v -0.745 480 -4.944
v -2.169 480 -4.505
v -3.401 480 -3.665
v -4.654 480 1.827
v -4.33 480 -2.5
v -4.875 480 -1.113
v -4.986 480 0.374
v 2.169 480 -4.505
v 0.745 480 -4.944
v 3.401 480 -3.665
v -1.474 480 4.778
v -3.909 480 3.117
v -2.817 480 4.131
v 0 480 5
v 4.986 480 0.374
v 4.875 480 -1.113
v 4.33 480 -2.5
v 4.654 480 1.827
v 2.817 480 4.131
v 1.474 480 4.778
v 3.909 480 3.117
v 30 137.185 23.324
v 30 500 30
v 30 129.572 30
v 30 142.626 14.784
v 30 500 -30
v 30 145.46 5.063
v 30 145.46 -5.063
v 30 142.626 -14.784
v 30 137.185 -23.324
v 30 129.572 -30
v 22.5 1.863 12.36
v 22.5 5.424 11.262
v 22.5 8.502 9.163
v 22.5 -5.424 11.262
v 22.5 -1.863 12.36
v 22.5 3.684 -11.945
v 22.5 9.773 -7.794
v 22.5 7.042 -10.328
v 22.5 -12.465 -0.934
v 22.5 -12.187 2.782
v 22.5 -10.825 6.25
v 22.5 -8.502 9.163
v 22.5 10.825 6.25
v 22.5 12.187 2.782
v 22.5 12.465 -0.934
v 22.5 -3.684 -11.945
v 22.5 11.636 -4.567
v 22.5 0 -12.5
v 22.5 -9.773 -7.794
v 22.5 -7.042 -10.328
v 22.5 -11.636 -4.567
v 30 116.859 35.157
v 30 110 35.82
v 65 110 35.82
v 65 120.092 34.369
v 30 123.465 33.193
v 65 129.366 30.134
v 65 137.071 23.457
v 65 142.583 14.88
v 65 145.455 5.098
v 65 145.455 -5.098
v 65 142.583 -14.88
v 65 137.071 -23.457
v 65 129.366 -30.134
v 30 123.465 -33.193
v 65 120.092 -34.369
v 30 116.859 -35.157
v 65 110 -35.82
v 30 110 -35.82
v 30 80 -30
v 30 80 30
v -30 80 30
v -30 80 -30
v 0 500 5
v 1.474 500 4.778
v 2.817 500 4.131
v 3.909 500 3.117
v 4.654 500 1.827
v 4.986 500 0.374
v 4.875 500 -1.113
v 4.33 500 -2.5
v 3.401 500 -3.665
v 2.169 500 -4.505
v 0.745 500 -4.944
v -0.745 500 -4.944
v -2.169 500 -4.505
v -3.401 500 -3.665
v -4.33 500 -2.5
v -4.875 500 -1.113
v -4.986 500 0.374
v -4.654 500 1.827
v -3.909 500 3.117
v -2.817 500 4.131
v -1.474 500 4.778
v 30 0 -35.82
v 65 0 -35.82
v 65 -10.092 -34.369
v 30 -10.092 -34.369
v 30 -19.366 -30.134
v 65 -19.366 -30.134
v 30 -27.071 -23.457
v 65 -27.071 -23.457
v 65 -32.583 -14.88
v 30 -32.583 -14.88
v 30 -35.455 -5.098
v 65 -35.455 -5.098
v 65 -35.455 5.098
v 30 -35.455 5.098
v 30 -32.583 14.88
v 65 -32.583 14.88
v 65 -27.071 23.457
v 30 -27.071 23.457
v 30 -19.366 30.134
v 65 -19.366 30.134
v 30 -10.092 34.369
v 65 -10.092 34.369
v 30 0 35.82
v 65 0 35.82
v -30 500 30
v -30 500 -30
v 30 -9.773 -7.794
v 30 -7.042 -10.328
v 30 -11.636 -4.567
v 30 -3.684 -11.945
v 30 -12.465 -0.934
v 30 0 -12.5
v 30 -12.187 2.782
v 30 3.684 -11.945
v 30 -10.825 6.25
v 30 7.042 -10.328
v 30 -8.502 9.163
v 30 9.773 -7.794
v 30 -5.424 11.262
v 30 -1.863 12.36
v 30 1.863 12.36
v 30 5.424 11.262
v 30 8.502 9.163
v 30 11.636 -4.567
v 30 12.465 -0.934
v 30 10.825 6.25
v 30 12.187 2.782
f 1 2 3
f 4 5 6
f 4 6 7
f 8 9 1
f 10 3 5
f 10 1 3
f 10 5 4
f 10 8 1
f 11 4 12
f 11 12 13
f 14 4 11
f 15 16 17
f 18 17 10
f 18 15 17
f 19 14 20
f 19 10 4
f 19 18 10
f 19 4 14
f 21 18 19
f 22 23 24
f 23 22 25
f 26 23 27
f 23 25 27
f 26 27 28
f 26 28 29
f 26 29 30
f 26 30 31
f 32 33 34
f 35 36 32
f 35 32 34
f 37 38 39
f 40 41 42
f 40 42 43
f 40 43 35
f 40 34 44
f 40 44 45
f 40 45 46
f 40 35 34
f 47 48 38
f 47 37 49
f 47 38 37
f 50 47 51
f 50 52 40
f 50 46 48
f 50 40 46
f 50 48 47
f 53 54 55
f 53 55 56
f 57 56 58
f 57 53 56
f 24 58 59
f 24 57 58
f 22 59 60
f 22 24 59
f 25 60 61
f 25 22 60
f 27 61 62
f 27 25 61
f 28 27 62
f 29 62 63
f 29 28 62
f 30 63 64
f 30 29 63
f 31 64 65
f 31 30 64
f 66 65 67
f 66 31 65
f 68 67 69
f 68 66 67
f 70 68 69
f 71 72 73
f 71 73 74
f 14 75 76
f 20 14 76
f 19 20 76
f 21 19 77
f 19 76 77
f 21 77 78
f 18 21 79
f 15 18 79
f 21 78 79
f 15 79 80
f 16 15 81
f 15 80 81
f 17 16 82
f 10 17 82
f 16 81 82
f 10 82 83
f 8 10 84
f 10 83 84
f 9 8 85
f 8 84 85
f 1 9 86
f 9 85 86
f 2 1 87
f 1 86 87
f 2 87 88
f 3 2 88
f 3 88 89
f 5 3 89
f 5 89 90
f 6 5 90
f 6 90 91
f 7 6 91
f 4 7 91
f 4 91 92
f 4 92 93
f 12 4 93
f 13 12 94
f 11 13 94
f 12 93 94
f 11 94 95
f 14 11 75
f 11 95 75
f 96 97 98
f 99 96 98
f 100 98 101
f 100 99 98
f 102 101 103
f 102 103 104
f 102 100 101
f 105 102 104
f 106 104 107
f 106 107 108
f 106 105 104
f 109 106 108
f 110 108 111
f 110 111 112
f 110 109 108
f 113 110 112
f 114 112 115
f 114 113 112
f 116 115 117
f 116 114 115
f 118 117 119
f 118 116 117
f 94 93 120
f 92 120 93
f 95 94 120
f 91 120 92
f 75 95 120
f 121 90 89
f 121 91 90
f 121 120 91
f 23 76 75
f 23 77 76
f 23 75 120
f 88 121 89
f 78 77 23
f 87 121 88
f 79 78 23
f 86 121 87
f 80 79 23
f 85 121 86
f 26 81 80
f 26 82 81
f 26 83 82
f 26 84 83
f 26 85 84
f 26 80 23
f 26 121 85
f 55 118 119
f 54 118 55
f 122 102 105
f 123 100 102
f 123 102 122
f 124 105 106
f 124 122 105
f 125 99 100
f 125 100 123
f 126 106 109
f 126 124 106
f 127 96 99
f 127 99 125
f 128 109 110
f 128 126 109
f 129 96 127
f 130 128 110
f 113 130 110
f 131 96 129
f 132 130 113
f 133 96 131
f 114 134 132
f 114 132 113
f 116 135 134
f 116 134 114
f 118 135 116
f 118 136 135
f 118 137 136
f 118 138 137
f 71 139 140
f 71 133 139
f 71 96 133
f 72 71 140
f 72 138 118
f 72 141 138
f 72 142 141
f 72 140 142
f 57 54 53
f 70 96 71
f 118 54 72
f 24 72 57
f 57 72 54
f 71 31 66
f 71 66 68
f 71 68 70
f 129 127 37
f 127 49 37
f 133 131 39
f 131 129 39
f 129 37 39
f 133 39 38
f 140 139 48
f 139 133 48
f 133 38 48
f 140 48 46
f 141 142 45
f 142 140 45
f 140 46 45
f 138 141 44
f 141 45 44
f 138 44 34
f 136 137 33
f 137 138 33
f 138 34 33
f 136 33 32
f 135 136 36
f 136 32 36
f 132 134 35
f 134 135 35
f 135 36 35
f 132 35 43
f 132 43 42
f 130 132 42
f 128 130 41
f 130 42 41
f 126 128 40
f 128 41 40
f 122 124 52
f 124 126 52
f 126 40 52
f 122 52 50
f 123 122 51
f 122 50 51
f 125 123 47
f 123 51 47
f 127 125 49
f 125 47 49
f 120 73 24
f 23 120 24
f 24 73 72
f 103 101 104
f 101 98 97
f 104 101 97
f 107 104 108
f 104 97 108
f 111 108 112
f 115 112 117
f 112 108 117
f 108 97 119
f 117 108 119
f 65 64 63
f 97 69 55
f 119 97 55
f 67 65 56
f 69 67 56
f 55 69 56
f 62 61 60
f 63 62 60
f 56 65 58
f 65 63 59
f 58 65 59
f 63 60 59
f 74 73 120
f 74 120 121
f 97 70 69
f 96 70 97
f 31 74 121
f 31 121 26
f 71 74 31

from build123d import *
from build123d.topology import SkipClean

# Parameters (mm, degrees)
SKETCH1_W                = 60
SKETCH1_H                = 60
BOSS_EXTRUDE1_DEPTH      = 500
BOSS_EXTRUDE6_DEPTH      = 2.5
BOSS_EXTRUDE6_DEPTH_BACK = 30
SKETCH2_R                = 12.5
CUT_EXTRUDE1_DEPTH       = 505.479930225
BOSS_EXTRUDE7_DEPTH      = 35
SKETCH7_W                = 30
SKETCH7_H                = 25
CUT_EXTRUDE2_DEPTH       = 15
SKETCH8_R                = 12.5
CUT_EXTRUDE3_DEPTH       = 22.5
SKETCH10_R               = 5
CUT_EXTRUDE4_DEPTH       = 20


with BuildPart() as part:
    # Sketch1 → Boss-Extrude1 (new body)
    with BuildSketch(Plane(origin=(0, 0, 0), x_dir=(1, 0, 0), z_dir=(0, 1, 0))):
        Rectangle(SKETCH1_W, SKETCH1_H)
    extrude(amount=BOSS_EXTRUDE1_DEPTH)

    # Sketch2 → Boss-Extrude6 (add, two sides: drawn at the far end of the back side and taken through both)
    with BuildSketch(Plane(origin=(30, 0, 0), x_dir=(0, 0, -1), z_dir=(1, 0, 0)).offset(-BOSS_EXTRUDE6_DEPTH_BACK)):
        Circle(SKETCH2_R)
    extrude(amount=BOSS_EXTRUDE6_DEPTH + BOSS_EXTRUDE6_DEPTH_BACK)

    # Sketch5 → Cut-Extrude1 (cut, through all)
    with SkipClean():  # the faces are left unmerged after this step: merging them gives an invalid solid
        with BuildSketch(Plane(origin=(30, 0, 0), x_dir=(0, 0, -1), z_dir=(1, 0, 0))):
            with BuildLine():
                Line((-30, 0), (-30, 80))
                Line((-30, 80), (30, 80))
                Line((30, 80), (30, 0))
                Line((30, 0), (12.5, 0))
                ThreePointArc((12.5, 0), (0, 12.5), (-12.5, 0))
                Line((-12.5, 0), (-30, 0))
            make_face()
        extrude(amount=-CUT_EXTRUDE1_DEPTH, mode=Mode.SUBTRACT)


with BuildPart() as cut_extrude1_piece_1:
    # of the separate pieces the step leaves, piece 1, a body of its own (cut_extrude1_pieces)
    add(part.part.solids().sort_by_distance((30, 80, -30))[0])



with BuildPart() as cut_extrude1_piece_2:
    # of the separate pieces the step leaves, piece 2, a body of its own (cut_extrude1_pieces)
    add(part.part.solids().sort_by_distance((0, 0, 12.5))[0])


with BuildPart() as cut_extrude1_piece_1_1:
    add(cut_extrude1_piece_1.part)

    add(cut_extrude1_piece_2.part)  # Boss-Extrude7 merges Cut-Extrude1 piece 2
    # Sketch6 → Boss-Extrude7 (add)
    with BuildSketch(Plane(origin=(30, 0, 0), x_dir=(0, 0, -1), z_dir=(1, 0, 0))):
        with BuildLine():
            Line((35.819788787, 110), (35.819788787, 0))
            ThreePointArc((35.819788787, 0), (0, -35.819788787), (-35.819788787, 0))
            Line((-35.819788787, 0), (-35.819788787, 110))
            ThreePointArc((-35.819788787, 110), (0, 145.819788787), (35.819788787, 110))
        make_face()
    extrude(amount=BOSS_EXTRUDE7_DEPTH)

    # Sketch7 → Cut-Extrude2 (cut)
    with BuildSketch(Plane.XZ):
        with Locations((-15, 0)):
            Rectangle(SKETCH7_W, SKETCH7_H)
    extrude(amount=-CUT_EXTRUDE2_DEPTH, mode=Mode.SUBTRACT)

    # Sketch8 → Cut-Extrude3 (cut)
    with BuildSketch(Plane.ZY):
        with Locations(Location((0, 0, 0), (0, 0, 180))):
            Circle(SKETCH8_R)
    extrude(amount=-CUT_EXTRUDE3_DEPTH, mode=Mode.SUBTRACT)

    # Sketch10 → Cut-Extrude4 (cut)
    with BuildSketch(Plane(origin=(0, 500, 0), x_dir=(1, 0, 0), z_dir=(0, 1, 0))):
        with Locations(Location((0, 0, 0), (0, 0, 270))):
            Circle(SKETCH10_R)
    extrude(amount=-CUT_EXTRUDE4_DEPTH, mode=Mode.SUBTRACT)


solid = cut_extrude1_piece_1_1.part
